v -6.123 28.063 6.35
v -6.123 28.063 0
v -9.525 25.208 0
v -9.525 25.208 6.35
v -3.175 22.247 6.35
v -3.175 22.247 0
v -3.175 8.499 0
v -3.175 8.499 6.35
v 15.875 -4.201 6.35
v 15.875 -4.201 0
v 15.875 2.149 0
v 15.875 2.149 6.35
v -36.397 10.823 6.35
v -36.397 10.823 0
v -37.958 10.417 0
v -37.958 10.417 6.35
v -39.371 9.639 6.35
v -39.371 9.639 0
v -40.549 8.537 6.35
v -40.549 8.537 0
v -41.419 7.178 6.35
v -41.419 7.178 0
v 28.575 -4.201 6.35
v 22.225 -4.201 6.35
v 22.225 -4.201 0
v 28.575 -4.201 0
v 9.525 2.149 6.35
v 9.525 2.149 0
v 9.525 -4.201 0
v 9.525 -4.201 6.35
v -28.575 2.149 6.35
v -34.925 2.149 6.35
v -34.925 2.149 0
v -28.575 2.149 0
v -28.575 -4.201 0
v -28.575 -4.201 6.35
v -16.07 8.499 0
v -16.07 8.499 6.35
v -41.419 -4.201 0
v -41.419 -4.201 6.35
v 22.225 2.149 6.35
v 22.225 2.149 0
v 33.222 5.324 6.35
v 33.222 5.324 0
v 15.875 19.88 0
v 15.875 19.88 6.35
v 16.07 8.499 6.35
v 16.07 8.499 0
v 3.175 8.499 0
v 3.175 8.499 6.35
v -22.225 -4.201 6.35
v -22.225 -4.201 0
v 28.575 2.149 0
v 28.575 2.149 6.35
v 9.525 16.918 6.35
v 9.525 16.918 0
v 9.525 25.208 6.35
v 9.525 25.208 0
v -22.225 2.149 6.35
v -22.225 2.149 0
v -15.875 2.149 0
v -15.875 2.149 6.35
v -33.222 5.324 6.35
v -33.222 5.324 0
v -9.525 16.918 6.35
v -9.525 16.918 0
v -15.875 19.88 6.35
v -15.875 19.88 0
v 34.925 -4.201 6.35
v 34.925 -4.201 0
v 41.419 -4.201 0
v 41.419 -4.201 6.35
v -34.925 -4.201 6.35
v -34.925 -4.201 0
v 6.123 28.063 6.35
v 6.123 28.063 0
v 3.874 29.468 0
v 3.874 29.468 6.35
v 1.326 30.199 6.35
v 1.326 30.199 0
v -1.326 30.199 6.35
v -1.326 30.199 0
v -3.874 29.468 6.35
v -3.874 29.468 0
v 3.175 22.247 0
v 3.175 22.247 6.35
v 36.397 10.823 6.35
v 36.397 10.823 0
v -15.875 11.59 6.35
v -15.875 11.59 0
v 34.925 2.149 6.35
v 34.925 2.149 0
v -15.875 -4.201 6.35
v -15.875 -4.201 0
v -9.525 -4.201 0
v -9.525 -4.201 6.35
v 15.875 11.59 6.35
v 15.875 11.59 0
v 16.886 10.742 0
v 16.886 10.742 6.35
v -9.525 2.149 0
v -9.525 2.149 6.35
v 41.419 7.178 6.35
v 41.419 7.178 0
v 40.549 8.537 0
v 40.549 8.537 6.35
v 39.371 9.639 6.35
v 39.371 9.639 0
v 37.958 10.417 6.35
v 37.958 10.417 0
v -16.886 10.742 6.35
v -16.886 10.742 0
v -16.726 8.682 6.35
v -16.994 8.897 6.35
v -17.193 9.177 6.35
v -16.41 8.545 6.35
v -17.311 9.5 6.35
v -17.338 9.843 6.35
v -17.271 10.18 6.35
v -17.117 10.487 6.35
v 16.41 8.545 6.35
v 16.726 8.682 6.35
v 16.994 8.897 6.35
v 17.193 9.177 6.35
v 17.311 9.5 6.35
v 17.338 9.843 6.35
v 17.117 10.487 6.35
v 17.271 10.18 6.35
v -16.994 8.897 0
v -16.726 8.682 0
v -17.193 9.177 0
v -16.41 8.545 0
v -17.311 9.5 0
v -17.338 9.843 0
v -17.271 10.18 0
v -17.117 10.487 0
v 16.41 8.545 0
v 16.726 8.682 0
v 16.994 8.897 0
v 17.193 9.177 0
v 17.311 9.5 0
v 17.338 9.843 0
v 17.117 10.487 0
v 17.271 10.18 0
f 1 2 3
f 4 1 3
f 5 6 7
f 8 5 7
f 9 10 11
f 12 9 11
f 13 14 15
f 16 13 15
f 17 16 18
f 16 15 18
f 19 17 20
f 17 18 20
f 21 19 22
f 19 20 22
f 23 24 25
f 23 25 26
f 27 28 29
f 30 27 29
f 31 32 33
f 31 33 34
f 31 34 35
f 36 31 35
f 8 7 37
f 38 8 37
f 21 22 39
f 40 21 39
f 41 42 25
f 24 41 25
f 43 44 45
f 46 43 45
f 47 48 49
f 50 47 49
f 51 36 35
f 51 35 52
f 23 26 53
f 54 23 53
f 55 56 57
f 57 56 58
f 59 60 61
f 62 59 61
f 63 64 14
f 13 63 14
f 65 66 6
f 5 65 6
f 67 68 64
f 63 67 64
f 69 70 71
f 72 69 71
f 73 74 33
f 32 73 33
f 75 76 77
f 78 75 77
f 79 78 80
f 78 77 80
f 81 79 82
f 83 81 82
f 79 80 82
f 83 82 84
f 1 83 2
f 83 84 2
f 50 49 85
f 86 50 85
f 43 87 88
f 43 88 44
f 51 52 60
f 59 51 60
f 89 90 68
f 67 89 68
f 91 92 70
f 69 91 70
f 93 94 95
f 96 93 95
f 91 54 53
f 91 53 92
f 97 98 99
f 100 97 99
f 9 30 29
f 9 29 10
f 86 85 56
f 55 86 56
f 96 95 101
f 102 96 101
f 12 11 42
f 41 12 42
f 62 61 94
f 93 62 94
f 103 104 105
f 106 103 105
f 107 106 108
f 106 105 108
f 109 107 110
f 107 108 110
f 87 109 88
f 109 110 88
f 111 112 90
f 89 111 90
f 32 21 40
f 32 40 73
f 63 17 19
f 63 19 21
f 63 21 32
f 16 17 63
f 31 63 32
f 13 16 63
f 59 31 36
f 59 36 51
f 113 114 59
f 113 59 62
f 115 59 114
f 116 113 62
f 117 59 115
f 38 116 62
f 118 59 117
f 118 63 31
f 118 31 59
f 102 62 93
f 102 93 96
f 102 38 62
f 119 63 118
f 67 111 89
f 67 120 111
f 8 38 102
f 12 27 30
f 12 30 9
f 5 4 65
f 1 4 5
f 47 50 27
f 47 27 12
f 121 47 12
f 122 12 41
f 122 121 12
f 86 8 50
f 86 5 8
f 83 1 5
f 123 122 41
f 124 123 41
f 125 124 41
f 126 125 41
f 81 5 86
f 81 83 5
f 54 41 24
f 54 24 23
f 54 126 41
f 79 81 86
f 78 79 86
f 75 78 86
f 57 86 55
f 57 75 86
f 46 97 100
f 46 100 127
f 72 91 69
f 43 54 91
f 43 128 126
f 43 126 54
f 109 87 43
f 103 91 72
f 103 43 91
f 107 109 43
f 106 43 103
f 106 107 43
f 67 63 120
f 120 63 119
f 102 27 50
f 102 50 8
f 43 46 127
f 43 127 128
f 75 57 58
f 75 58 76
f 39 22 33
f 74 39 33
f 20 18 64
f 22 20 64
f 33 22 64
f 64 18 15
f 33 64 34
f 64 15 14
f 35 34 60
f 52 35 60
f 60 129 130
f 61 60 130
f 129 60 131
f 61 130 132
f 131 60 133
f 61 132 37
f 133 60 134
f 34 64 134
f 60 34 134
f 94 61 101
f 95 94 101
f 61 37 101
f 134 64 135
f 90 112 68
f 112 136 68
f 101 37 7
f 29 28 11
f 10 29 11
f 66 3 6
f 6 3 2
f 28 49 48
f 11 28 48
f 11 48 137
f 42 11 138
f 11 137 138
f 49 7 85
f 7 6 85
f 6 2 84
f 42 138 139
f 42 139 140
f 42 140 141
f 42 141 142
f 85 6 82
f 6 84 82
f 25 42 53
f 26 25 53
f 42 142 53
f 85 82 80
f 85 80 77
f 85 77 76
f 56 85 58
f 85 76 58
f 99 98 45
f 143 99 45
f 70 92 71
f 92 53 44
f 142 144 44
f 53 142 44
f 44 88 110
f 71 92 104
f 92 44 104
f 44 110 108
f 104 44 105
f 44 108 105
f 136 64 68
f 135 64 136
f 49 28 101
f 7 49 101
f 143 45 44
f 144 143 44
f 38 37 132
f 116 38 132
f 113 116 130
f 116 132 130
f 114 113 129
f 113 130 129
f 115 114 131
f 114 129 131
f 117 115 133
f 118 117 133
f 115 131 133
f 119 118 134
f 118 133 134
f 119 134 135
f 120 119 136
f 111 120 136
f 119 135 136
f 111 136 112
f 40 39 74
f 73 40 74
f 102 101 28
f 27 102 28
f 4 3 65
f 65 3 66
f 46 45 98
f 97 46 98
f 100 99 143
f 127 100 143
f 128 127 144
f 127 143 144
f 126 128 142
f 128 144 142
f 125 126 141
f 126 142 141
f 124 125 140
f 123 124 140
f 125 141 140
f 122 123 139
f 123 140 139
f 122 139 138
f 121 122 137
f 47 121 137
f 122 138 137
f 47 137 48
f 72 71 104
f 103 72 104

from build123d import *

# Parameters (mm, degrees)
BOSS_EXTRUDE1_DEPTH = 6.35


with BuildPart() as part:
    # Sketch1 → Boss-Extrude1 (new body)
    with BuildSketch(Plane.XY):
        with BuildLine():
            Line((-16.886131477, 10.741733319), (-15.875, 11.590173369))
            Line((-15.875, 11.590173369), (-15.875, 19.879509656))
            Line((-15.875, 19.879509656), (-33.221751492, 5.323856877))
            Line((-33.221751492, 5.323856877), (-36.396751492, 10.823118191))
            ThreePointArc((-36.396751492, 10.823118191), (-39.371085636, 9.639070453), (-41.418515119, 7.178041166))
            Line((-41.418515119, 7.178041166), (-41.418515119, -4.201143123))
            Line((-41.418515119, -4.201143123), (-34.925, -4.201143123))
            Line((-34.925, -4.201143123), (-34.925, 2.148856877))
            Line((-34.925, 2.148856877), (-28.575, 2.148856877))
            Line((-28.575, 2.148856877), (-28.575, -4.201143123))
            Line((-28.575, -4.201143123), (-22.225, -4.201143123))
            Line((-22.225, -4.201143123), (-22.225, 2.148856877))
            Line((-22.225, 2.148856877), (-15.875, 2.148856877))
            Line((-15.875, 2.148856877), (-15.875, -4.201143123))
            Line((-15.875, -4.201143123), (-9.525, -4.201143123))
            Line((-9.525, -4.201143123), (-9.525, 2.148856877))
            Line((-9.525, 2.148856877), (9.525, 2.148856877))
            Line((9.525, 2.148856877), (9.525, -4.201143123))
            Line((9.525, -4.201143123), (15.875, -4.201143123))
            Line((15.875, -4.201143123), (15.875, 2.148856877))
            Line((15.875, 2.148856877), (22.225, 2.148856877))
            Line((22.225, 2.148856877), (22.225, -4.201143123))
            Line((22.225, -4.201143123), (28.575, -4.201143123))
            Line((28.575, -4.201143123), (28.575, 2.148856877))
            Line((28.575, 2.148856877), (34.925, 2.148856877))
            Line((34.925, 2.148856877), (34.925, -4.201143123))
            Line((34.925, -4.201143123), (41.418515119, -4.201143123))
            Line((41.418515119, -4.201143123), (41.418515119, 7.178041166))
            ThreePointArc((41.418515119, 7.178041166), (39.371085636, 9.639070453), (36.396751492, 10.823118191))
            Line((36.396751492, 10.823118191), (33.221751492, 5.323856877))
            Line((33.221751492, 5.323856877), (15.875, 19.879509656))
            Line((15.875, 19.879509656), (15.875, 11.590173369))
            Line((15.875, 11.590173369), (16.886131477, 10.741733319))
            ThreePointArc((16.886131477, 10.741733319), (17.263200841, 9.334491295), (16.069791213, 8.498856877))
            Line((16.069791213, 8.498856877), (3.175, 8.498856877))
            Line((3.175, 8.498856877), (3.175, 22.246738685))
            Line((3.175, 22.246738685), (9.525, 16.918456027))
            Line((9.525, 16.918456027), (9.525, 25.207792314))
            Line((9.525, 25.207792314), (6.122551982, 28.062785191))
            ThreePointArc((6.122551982, 28.062785191), (0, 30.29121187), (-6.122551982, 28.062785191))
            Line((-6.122551982, 28.062785191), (-9.525, 25.207792314))
            Line((-9.525, 25.207792314), (-9.525, 16.918456027))
            Line((-9.525, 16.918456027), (-3.175, 22.246738685))
            Line((-3.175, 22.246738685), (-3.175, 8.498856877))
            Line((-3.175, 8.498856877), (-16.069791213, 8.498856877))
            ThreePointArc((-16.069791213, 8.498856877), (-17.263200841, 9.334491295), (-16.886131477, 10.741733319))
        make_face()
    extrude(amount=BOSS_EXTRUDE1_DEPTH)


solid = part.part
